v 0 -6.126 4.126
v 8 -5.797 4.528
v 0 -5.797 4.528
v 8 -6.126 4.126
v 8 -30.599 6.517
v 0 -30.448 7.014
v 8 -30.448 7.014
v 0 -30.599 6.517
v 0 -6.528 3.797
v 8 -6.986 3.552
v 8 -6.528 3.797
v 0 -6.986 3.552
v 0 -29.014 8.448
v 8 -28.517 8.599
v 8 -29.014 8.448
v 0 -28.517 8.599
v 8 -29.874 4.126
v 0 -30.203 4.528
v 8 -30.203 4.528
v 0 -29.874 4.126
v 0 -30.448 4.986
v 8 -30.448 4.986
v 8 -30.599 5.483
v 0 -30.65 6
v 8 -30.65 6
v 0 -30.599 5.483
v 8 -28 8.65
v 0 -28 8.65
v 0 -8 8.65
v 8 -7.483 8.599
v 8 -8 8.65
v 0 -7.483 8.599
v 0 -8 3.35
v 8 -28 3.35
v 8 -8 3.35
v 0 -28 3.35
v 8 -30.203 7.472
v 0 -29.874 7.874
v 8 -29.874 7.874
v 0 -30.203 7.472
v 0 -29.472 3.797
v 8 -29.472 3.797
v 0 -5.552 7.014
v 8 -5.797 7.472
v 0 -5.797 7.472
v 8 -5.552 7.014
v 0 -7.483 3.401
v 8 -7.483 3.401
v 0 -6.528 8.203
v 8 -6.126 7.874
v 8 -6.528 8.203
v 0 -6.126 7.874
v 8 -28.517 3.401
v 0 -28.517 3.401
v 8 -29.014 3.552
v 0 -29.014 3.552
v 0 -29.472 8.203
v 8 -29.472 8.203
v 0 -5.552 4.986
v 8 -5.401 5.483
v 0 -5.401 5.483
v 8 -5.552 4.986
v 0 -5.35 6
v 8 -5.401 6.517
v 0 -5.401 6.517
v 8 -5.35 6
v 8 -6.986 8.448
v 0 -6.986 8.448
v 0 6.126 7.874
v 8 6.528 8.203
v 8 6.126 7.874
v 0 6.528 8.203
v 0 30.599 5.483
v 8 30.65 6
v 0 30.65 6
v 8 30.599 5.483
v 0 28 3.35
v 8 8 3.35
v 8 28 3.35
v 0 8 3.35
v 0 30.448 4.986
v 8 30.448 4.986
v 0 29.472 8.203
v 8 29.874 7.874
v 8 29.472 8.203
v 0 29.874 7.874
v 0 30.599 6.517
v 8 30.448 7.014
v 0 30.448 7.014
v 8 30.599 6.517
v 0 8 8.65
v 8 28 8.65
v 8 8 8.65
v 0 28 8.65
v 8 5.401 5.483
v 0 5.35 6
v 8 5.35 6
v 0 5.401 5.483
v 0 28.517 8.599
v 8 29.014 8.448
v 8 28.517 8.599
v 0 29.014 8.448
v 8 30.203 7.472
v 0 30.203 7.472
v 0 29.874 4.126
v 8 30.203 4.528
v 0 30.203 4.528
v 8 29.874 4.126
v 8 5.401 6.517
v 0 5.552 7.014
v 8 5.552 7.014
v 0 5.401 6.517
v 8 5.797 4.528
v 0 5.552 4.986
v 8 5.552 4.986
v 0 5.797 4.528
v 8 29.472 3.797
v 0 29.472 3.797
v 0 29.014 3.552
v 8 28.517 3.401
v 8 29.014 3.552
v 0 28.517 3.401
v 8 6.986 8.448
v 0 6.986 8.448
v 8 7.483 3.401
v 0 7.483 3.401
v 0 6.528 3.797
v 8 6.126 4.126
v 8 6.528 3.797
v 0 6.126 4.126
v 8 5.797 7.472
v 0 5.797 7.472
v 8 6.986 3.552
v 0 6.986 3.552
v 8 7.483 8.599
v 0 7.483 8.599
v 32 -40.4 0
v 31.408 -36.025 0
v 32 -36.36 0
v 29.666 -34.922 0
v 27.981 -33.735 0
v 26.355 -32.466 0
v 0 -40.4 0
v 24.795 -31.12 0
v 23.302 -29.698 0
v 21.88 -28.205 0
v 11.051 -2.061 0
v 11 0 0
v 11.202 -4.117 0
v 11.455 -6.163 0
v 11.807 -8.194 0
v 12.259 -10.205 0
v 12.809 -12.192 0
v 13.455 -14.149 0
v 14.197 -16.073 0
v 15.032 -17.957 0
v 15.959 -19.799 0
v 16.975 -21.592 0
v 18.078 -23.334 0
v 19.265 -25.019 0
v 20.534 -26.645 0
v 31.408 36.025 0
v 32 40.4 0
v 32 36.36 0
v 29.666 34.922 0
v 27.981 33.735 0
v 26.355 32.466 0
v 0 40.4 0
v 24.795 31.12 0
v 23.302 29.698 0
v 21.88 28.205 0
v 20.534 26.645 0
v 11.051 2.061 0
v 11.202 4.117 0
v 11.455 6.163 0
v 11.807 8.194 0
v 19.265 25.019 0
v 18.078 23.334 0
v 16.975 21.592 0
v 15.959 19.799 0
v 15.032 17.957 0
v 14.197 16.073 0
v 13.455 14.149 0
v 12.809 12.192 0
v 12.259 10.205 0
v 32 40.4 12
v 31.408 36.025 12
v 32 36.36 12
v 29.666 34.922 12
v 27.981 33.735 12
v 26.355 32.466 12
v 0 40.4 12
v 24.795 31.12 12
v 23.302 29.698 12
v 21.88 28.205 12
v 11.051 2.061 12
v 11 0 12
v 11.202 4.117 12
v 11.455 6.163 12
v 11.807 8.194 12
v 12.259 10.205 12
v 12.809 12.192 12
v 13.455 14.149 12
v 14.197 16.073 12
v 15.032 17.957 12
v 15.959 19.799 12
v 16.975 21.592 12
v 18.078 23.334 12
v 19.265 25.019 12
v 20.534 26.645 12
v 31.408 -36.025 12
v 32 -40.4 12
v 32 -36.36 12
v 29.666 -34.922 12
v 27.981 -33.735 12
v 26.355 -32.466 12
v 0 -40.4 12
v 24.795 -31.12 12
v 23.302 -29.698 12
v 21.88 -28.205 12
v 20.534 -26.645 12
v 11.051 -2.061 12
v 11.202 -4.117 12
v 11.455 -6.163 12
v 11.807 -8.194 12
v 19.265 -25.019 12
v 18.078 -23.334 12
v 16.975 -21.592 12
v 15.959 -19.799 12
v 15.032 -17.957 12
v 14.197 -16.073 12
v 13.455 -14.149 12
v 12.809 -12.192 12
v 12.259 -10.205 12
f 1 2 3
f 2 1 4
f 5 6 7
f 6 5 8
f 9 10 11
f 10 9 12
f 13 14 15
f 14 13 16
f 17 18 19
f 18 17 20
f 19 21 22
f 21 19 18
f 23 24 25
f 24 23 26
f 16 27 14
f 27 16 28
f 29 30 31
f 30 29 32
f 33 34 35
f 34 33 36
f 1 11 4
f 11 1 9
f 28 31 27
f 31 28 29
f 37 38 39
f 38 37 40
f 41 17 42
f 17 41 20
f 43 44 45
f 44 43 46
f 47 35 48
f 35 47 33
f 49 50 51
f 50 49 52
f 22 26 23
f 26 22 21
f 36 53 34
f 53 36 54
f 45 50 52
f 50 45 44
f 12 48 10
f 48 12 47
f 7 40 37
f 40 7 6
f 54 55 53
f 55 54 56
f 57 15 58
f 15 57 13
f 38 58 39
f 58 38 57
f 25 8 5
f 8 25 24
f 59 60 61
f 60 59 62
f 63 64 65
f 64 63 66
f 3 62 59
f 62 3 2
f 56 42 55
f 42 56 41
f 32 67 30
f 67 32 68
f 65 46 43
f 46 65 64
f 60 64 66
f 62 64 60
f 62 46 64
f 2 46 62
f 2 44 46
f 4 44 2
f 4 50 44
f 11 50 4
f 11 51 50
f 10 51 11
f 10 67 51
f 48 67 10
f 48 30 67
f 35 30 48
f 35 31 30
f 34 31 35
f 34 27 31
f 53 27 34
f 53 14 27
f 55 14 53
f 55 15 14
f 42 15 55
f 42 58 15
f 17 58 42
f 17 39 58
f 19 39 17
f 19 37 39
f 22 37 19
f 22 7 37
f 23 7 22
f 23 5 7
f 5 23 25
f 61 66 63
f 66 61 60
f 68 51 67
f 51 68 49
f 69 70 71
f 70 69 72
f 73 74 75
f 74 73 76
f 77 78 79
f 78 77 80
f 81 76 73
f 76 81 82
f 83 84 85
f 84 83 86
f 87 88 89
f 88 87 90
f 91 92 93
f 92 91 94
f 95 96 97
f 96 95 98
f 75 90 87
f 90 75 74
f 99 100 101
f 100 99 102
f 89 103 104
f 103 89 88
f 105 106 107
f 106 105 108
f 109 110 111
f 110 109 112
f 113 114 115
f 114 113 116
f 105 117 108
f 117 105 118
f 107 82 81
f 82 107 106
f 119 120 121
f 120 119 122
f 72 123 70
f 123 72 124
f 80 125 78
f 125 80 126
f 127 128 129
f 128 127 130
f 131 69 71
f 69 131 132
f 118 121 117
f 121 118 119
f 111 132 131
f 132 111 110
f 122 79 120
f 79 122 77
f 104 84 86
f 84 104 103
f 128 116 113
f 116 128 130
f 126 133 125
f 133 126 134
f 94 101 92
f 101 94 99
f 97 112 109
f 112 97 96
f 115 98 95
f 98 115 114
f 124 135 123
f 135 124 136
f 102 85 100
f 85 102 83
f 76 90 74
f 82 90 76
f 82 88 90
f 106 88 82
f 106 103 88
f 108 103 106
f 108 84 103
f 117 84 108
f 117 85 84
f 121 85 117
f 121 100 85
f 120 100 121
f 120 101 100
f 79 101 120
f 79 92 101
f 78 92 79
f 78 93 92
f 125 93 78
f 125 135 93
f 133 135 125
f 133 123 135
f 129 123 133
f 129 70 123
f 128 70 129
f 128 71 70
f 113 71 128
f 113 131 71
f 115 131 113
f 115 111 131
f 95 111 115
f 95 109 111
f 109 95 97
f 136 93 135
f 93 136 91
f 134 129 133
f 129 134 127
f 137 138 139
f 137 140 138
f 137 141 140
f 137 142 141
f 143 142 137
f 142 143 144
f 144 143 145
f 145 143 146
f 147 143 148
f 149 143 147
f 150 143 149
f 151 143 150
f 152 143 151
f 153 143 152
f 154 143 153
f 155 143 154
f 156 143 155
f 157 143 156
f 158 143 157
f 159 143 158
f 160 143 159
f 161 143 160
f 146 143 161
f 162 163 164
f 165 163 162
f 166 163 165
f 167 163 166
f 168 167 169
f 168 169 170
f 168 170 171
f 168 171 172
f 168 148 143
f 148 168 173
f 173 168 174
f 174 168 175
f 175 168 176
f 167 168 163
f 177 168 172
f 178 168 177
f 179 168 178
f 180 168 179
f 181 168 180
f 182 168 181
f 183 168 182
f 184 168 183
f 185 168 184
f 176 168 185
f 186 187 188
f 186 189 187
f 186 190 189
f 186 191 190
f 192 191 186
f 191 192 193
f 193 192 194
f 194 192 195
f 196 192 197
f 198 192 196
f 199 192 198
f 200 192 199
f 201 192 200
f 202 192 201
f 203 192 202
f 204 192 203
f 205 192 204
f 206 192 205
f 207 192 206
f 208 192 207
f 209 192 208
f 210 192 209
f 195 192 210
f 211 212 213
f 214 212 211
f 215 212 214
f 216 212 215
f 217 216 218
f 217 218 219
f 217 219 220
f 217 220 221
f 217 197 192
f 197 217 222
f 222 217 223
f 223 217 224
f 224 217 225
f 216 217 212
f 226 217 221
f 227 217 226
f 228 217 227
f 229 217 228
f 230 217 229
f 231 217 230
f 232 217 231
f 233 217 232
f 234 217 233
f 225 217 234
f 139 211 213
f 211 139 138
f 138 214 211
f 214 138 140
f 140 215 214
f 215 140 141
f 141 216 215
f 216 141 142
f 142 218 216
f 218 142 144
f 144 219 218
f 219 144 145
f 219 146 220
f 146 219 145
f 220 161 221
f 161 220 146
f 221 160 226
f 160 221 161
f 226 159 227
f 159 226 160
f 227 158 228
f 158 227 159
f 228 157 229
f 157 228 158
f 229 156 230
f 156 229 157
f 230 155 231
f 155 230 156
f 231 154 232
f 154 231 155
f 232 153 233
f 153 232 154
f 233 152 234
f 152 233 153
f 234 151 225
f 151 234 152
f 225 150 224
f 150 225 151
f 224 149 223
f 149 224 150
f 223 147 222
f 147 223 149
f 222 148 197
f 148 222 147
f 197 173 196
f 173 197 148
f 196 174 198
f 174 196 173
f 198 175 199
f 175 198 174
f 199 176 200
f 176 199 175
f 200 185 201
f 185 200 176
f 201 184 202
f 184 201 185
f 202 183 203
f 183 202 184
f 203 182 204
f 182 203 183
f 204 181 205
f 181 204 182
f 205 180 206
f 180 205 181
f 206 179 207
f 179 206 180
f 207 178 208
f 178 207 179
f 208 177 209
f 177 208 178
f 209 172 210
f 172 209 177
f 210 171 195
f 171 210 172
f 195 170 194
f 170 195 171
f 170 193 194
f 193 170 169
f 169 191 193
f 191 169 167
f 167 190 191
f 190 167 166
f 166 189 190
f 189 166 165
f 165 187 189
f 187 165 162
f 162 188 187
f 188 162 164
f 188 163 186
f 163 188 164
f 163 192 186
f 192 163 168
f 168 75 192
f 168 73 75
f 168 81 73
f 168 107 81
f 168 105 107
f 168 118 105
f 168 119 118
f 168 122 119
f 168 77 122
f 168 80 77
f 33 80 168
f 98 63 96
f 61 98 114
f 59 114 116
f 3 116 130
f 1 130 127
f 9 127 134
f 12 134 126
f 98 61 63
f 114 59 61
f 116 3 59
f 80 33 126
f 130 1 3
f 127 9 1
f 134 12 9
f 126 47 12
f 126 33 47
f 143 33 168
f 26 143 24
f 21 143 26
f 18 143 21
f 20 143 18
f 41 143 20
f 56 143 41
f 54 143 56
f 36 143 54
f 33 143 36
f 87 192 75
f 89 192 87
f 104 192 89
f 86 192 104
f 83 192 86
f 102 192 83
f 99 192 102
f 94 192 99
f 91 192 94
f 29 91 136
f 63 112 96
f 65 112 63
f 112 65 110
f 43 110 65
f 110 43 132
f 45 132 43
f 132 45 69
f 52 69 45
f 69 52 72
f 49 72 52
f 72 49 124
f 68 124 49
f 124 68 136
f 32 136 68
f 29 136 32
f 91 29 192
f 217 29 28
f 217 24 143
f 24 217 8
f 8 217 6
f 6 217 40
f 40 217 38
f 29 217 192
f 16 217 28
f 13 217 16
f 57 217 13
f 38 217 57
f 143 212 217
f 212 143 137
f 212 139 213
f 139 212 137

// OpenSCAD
// file: ../../lib/util.scad
// ==========================================================================
//  Turtle Body -- shared helper modules and functions
// --------------------------------------------------------------------------
//  Small pieces that were copy-pasted across the standalone files. Geometry
//  lives in the per-subsystem lib/ modules; this file is only glue.
//
//  Definitions only -- no top-level geometry, no top-level assignments.
// ==========================================================================

use <params.scad>

// Colour wrapper for wooden parts. When colour coding is off, every wooden
// component renders in one neutral wood tone; bottles, hardware, sails and
// printed parts keep their own colours and never call this.
module wood_color(coded_color, enabled = true, neutral = [0.94, 0.83, 0.62]) {
    color(enabled ? coded_color : neutral) children();
}

// scalar clamp
function clamp(v, lo, hi) = v < lo ? lo : (v > hi ? hi : v);

// Visual-only M6 bolt: plain shaft + hex-less cylindrical head. No thread,
// no torque rating -- a placeholder for fit inspection.
//  Local Z=0 is the underside of the head; the shaft runs toward +Z from Z=0
//  (plus an optional tip_extension), the head sits at Z=-head_t..0. Matches
//  the standalone files.
module m6_bolt_placeholder(grip_length, tip_extension = 1,
                           shaft_d = undef, head_d = undef, head_t = undef,
                           color_rgb = [0.15, 0.15, 0.15], fn = 48) {
    sd = shaft_d == undef ? p_m6_bolt_shaft_d() : shaft_d;
    hd = head_d  == undef ? p_m6_bolt_head_d()  : head_d;
    ht = head_t  == undef ? p_m6_bolt_head_t()  : head_t;
    assert(grip_length > 0, "m6_bolt_placeholder: grip_length must be positive.");
    color(color_rgb)
        union() {
            cylinder(d = sd, h = grip_length + tip_extension, $fn = fn);
            translate([0, 0, -ht])
                cylinder(d = hd, h = ht, $fn = fn);
        }
}

// Regular hexagonal prism specified by across-flats width (OpenSCAD's
// cylinder($fn=6) is specified across corners, which is the usual trap).
module hex_prism_af(across_flats, h, center = false) {
    cylinder(d = across_flats / cos(30), h = h, $fn = 6, center = center);
}
// file: ../../lib/pressor.scad
// ==========================================================================
//  Turtle Body -- pressor: bottle clamp block for an Ecojoiner port
//  (lib module, EXPERIMENTAL, v6.6.1)
// --------------------------------------------------------------------------
//  A flat block cut from the 12 mm board stock that sits in the port gap
//  between a Little John's port face and the bottle. Its inner edge is cut
//  concave to the bottle radius so it wraps the bottle flush. The John's two
//  M5 cap screws pass through the John into Ø5.3 holes (p_pressor_hole_d()) in the
//  pressor's straight back edge. Because the screw bites both pieces, turning
//  it in carries the pressor toward the bottle: the screws push it, with no
//  acorn nut. Two pressors per port, one each side, hug the bottle between
//  them. Not built, fitted or tested.
//
//  Local frame (one pressor, as installed on the -X side of the bottle):
//    X = across the port, from the John toward the bottle. X = 0 is the
//        pressor's straight back edge (faces the John).
//    Y = across the port, along the John height, centred on the bottle axis.
//        The block spans the full port height between the Long Johns.
//    Z = along the bottle axis = the board thickness, Z = 0..t.
//  The concave arc is centred at X = back-to-bottle-axis, Y = 0, radius =
//  bottle radius. The block's inner (straight) edge stands
//  p_pressor_wrap() past the bottle's tangent line, so the arc runs out at
//  Y = +-sqrt(r^2 - (r - wrap)^2) and the corners beyond stay square.
//
//  Pressed (installed) state: the arc meets the bottle; the back edge sits
//  p_pressor_travel() off the John face. Relaxed, the back is on the John and
//  the arc stands that far off the bottle.
//
//  Definitions only. Geometry is emitted by pressor(), pressor_2d() or
//  pressor_port_assembly().
// ==========================================================================

use <params.scad>
use <util.scad>
use <ecojoiner.scad>

function pr_t()         = p_wood_t();
function pr_r()         = p_bottle_d() / 2;
function pr_gap()       = eco_port_gap();                         // 12: John face -> bottle
function pr_core_w()    = pr_gap() - p_pressor_travel();          // 11: back edge -> bottle, on the centreline
function pr_width()     = pr_core_w() + p_pressor_wrap();         // 32: back edge -> inner edge
function pr_height()    = p_port_height() - p_fit_clearance()
                          - 2 * p_pressor_end_trim();             // 80.8: slides between the Long Johns
                                                                  // (v6.6.4: 83.8 printed 3 mm too long)
function pr_axis_x()    = pr_core_w() + pr_r();                   // 53: back edge -> bottle axis
function pr_arc_half()  = let(a = pr_r() - p_pressor_wrap())
                          sqrt(pr_r() * pr_r() - a * a);          // 36.4: arc ends at +-Y
function pr_screw_ys()  = [-p_eco_screw_pair_offset(), p_eco_screw_pair_offset()];
// wood along a screw line, back edge -> bottle surface (the bottle has curved away off-centre)
function pr_wood_at_screw() = let(v = p_eco_screw_pair_offset())
    pr_axis_x() - sqrt(pr_r() * pr_r() - v * v);                  // 15.05
// pill slot along the edge (v6.6.4): screw line +- p_pressor_slot_ext()
function pr_slot_inner_y() = p_eco_screw_pair_offset() - p_pressor_slot_ext() - p_pressor_hole_d() / 2; // 5.35
function pr_slot_outer_y() = p_eco_screw_pair_offset() + p_pressor_slot_ext() + p_pressor_hole_d() / 2; // 30.65
// wood behind the slot at its inner end -- the thinnest point (bottle closest)
function pr_wood_at_slot() = let(v = pr_slot_inner_y())
    pr_axis_x() - sqrt(pr_r() * pr_r() - v * v);                  // 11.34 at Ø84
// how far the cap-screw head stands off the John's outer face when pressed
function pr_head_standoff() = p_m5_bolt_len() - pr_t() - p_pressor_travel()
                              - p_pressor_hole_depth();            // 7

function pr_yellow() = [0.95, 0.55, 0.15];

module pressor_assert_valid() {
    assert(pr_core_w() > 0,
           "Pressor: travel leaves no wood on the centreline -- port gap too small.");
    assert(p_pressor_wrap() > 0 && p_pressor_wrap() < pr_r(),
           "Pressor: wrap must be between 0 and the bottle radius (the pair would meet).");
    assert(pr_arc_half() < pr_height() / 2,
           "Pressor: the arc would run out of the top/bottom edge.");
    assert(p_eco_screw_pair_offset() < pr_arc_half(),
           "Pressor: M5 pair sits outside the arc -- the screw lines miss the bottle contact.");
    assert(pr_t() - p_pressor_hole_d() >= 2 * p_pressor_min_wall(),
           "Pressor: board too thin around the M5 holes.");
    assert(pr_wood_at_slot() - p_pressor_hole_depth() >= p_pressor_min_wall(),
           "Pressor: M5 slot too deep -- its inner end would break through toward the bottle.");
    assert(pr_slot_inner_y() > 0,
           "Pressor: the two M5 slots would merge across the centreline.");
    assert(pr_slot_outer_y() <= pr_height() / 2 - p_pressor_min_wall(),
           "Pressor: M5 slot runs too close to the top/bottom edge.");
    assert(pr_head_standoff() >= 0,
           "Pressor: M5 screw too short to reach the hole depth through the John.");
    assert(pr_width() <= p_fin_board_w(),
           "Pressor: wider than the board it is cut from.");
}

// Flat profile, back edge on X = 0, centred on Y = 0.
module pressor_2d(fn = 128) {
    difference() {
        translate([0, -pr_height() / 2]) square([pr_width(), pr_height()]);
        translate([pr_axis_x(), 0]) circle(r = pr_r(), $fn = fn);
    }
}

// One pressor, board thickness on Z = 0..t, with the two M5 openings cut
// into the back edge at mid-thickness. v6.6.4: each opening is a pill slot,
// the Ø5.3 hole stretched p_pressor_slot_ext() each way along the edge (Y),
// so the John's screws locate without exact alignment.
module pressor(fn = 128, colored = true) {
    pressor_assert_valid();
    e = p_pressor_slot_ext();
    wood_color(pr_yellow(), colored)
        difference() {
            linear_extrude(height = pr_t()) pressor_2d(fn);
            for (y = pr_screw_ys())
                hull() for (dy = [-e, e])
                    translate([-0.01, y + dy, pr_t() / 2]) rotate([0, 90, 0])
                        cylinder(d = p_pressor_hole_d(), h = p_pressor_hole_depth() + 0.01, $fn = 32);
        }
}

// Inspection view of one port slice, looking down the bottle axis (Z):
// ONE pressor (the -X side) pressed onto the bottle, with a translucent
// stand-in for its Little John (port face at X = -(r + gap)). Bottle axis at
// the origin. The stand-in and the bottle are F5 references only, so F6/STL
// output is always a single piece (v6.6.3; was the mirrored pair). The
// second pressor of a port is the same part, turned to face the bottle from
// the other side. The M5 screws are not modelled (v6.6.2).
module pressor_port_assembly(fn = 128, colored = true, show_references = true) {
    face_x = pr_r() + pr_gap();                       // bottle axis -> John port face
    // pressed: back edge p_pressor_travel() off the John face
    translate([-face_x + p_pressor_travel(), 0, 0]) pressor(fn, colored);
    if (show_references)
        %translate([-face_x - pr_t(), -eco_john_height() / 2, -pr_t()])
            cube([pr_t(), eco_john_height(), 3 * pr_t()]);
    if (show_references)
        %translate([0, 0, -pr_t()]) cylinder(r = pr_r(), h = 3 * pr_t(), $fn = fn);
}

module pressor_echo() {
    echo(str("PRESSOR: ", pr_width(), " x ", pr_height(), " x ", pr_t(),
             " mm | centreline wood ", pr_core_w(), " | arc +-", pr_arc_half(),
             " | wood on screw line ", pr_wood_at_screw(),
             " | M5 slot d/depth ", p_pressor_hole_d(), "/", p_pressor_hole_depth(),
             " y ", pr_slot_inner_y(), "..", pr_slot_outer_y(),
             " | wood behind slot ", pr_wood_at_slot(),
             " | head standoff ", pr_head_standoff()));
}
// main file
/*
 Hope Turtle pressor -- Ecojoiner bottle clamp block. Units: mm. License: CERN-OHL-S-2.0.
 EXPERIMENTAL -- not built, fitted or tested. Not yet used by the Ecojoiner
 or full-turtle assemblies (they still show acorn nuts).
 A 12 mm board block in the port gap between a Little John and the bottle,
 its inner edge cut concave to the bottle radius. The John's two M5 cap
 screws drive into two 5.3 mm pill slots (+-10 mm along the edge, v6.6.4) in its back edge and push it onto the
 bottle as they are turned in (screws not modelled). Two are used per port; this file always
 outputs ONE (default part="pressor", already in the print pose). Print part="pressor"
 flat on its board face; the edge holes are horizontal bores. Two per port, one each side of the bottle (24 for six ports).

 SOURCE FILE — geometry lives in lib/pressor.scad + lib/params.scad.
 The committed self-contained file is generated by build/build.py.
*/

/* [Display] */
part = "pressor"; // [pressor,assembly,profile]  -- every part is ONE piece
show_references = true;     // translucent bottle + Little John stand-ins (F5 only)
enable_color_coding = true; // false = neutral shades of brown

/* [Render] */
fn = 128;

use <../../lib/pressor.scad>

pressor_echo();

if (part == "assembly") {
    // one pressor in its port, pressed onto the bottle (references are F5 only)
    pressor_port_assembly(fn = fn, colored = enable_color_coding,
                          show_references = show_references);
} else if (part == "pressor") {
    // one piece, lying flat on its board face -- the print / STL pose
    pressor(fn = fn, colored = enable_color_coding);
} else if (part == "profile") {
    // 2D cutting outline (export as DXF/SVG); holes are drilled into the edge
    pressor_2d(fn = fn);
} else {
    assert(false, str("Unknown part: ", part));
}
